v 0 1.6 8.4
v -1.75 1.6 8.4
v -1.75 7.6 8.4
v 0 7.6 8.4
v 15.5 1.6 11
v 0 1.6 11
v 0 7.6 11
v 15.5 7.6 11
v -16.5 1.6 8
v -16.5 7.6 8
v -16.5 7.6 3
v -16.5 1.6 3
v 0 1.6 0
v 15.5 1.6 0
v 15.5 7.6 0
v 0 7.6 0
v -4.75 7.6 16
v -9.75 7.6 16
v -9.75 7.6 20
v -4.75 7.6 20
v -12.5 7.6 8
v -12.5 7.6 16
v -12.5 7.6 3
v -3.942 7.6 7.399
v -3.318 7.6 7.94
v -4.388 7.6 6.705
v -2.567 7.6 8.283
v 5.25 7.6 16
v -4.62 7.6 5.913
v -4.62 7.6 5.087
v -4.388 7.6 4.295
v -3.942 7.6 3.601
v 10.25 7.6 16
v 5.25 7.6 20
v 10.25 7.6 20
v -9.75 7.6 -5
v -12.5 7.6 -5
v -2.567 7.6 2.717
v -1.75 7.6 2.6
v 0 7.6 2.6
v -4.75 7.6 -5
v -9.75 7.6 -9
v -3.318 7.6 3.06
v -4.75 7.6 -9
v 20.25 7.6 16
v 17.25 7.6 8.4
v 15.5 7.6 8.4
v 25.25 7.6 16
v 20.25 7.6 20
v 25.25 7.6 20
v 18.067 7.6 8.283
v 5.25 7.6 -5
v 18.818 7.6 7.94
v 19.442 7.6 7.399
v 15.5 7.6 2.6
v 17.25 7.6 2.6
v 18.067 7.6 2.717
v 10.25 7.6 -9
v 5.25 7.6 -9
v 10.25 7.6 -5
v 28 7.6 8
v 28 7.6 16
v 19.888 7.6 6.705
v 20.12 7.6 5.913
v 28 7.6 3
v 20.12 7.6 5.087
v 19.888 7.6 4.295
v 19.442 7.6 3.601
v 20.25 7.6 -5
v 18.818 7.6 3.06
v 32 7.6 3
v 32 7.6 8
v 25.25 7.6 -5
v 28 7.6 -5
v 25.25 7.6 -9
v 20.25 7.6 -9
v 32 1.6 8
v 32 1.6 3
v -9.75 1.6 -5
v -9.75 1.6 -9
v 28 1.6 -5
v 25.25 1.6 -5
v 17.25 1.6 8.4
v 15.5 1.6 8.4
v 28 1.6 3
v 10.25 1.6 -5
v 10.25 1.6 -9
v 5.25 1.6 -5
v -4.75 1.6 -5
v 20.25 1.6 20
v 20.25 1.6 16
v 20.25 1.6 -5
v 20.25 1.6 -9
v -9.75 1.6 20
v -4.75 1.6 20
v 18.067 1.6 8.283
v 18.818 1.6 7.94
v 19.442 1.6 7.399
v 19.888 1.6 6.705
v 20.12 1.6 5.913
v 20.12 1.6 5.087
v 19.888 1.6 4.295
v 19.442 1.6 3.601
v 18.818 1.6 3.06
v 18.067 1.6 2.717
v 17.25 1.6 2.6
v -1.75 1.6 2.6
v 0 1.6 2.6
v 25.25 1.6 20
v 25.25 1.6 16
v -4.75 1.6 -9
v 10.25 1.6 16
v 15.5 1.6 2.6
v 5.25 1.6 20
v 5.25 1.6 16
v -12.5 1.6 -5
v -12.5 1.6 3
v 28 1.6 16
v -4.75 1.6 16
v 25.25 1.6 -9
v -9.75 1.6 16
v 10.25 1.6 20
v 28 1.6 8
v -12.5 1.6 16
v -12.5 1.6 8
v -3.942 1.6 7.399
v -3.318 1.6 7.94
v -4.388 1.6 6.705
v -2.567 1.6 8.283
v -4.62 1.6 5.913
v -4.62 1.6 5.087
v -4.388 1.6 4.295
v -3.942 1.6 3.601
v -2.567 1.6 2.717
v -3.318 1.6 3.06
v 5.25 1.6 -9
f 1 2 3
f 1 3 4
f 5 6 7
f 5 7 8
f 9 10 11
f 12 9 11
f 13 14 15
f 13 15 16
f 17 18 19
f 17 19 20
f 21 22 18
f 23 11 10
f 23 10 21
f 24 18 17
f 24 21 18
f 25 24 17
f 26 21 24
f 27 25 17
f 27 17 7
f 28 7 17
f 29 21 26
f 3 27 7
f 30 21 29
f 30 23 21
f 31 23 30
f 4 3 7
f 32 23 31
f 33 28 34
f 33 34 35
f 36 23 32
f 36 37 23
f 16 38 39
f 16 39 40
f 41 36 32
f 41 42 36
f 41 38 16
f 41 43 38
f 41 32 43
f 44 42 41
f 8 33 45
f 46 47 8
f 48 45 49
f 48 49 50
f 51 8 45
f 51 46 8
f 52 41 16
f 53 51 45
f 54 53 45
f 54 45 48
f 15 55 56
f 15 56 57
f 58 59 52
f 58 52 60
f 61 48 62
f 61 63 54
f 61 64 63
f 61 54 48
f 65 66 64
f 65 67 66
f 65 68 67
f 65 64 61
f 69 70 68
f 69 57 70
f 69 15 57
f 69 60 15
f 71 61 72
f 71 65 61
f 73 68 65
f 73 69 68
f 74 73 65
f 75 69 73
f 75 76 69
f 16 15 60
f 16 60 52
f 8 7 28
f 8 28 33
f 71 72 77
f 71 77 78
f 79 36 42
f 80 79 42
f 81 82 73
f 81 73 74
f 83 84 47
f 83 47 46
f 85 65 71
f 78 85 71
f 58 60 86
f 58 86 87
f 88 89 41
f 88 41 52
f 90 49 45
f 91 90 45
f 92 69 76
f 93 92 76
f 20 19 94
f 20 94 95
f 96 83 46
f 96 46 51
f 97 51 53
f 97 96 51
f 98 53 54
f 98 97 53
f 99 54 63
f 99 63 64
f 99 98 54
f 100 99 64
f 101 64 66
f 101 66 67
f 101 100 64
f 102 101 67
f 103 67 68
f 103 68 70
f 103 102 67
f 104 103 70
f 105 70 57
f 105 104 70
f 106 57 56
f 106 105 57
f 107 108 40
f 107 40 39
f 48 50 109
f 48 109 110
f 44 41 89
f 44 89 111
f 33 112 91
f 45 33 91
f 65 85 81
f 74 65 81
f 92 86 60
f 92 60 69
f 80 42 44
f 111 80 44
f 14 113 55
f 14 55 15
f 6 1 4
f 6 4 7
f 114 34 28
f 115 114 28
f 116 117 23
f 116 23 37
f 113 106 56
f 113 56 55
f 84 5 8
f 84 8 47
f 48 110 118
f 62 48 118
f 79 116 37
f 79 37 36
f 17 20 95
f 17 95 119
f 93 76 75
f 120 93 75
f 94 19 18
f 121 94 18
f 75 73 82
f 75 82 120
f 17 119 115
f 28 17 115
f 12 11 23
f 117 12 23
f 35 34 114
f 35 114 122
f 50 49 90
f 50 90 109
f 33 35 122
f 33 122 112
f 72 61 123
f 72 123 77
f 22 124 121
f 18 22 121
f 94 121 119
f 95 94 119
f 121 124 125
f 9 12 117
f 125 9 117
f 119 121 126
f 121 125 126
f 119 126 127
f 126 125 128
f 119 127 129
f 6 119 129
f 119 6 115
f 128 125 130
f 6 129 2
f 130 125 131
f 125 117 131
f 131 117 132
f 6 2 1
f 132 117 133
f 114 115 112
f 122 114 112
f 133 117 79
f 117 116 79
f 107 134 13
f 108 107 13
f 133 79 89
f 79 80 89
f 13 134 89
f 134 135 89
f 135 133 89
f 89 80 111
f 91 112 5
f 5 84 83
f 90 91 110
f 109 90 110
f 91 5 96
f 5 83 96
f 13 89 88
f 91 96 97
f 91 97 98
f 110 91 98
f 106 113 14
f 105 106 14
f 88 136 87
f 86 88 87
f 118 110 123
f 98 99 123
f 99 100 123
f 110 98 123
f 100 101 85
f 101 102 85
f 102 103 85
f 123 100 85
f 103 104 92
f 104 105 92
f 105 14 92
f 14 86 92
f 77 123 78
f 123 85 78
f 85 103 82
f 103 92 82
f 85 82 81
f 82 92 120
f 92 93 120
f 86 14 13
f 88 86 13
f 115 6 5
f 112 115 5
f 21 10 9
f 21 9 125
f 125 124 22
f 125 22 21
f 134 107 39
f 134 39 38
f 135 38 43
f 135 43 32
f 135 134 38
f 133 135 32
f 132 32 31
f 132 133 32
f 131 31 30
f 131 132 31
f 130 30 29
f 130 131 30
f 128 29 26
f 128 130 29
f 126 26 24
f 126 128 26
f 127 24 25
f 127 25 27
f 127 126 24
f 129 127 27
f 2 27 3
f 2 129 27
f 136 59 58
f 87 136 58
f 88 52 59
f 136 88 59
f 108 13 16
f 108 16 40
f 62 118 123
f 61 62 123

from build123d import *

# Parameters (mm, degrees)
SKETCH1_W           = 15.5
SKETCH1_H           = 11
BOSS_EXTRUDE1_DEPTH = 1.6
BOSS_EXTRUDE2_DEPTH = 1.6
SKETCH3_W           = 40.5
SKETCH3_H           = 21
BOSS_EXTRUDE3_DEPTH = 6
CUT_EXTRUDE1_DEPTH  = 2.6
SKETCH5_W           = 5
SKETCH5_H           = 4
BOSS_EXTRUDE4_DEPTH = 6
LPATTERN1_COUNT     = 2
LPATTERN1_PITCH     = 15
LPATTERN1_COL_COUNT = 2
LPATTERN1_COL_PITCH = 15
SKETCH6_W           = 4
SKETCH6_H           = 5
BOSS_EXTRUDE5_DEPTH = 6


with BuildPart() as part:
    # Sketch1 → Boss-Extrude1 (new body)
    with BuildSketch(Plane(origin=(0, 0, 0), x_dir=(1, 0, 0), z_dir=(0, 1, 0))):
        with Locations((7.75, -5.5)):
            Rectangle(SKETCH1_W, SKETCH1_H)
    extrude(amount=BOSS_EXTRUDE1_DEPTH)

    # Sketch2 → Boss-Extrude2 (add, through all)
    with BuildSketch(Plane(origin=(0, 1.6, 0), x_dir=(1, 0, 0), z_dir=(0, 1, 0))):
        with BuildLine():
            Line((-1.75, -4), (-1.75, -2.6))
            ThreePointArc((-1.75, -2.6), (-4.65, -5.5), (-1.75, -8.4))
            Line((-1.75, -8.4), (-1.75, -7))
            ThreePointArc((-1.75, -7), (-3.25, -5.5), (-1.75, -4))
        make_face()
        with BuildLine():
            ThreePointArc((0, -3.187533784), (-0.827002716, -2.750804479), (-1.75, -2.6))
            Line((-1.75, -2.6), (-1.75, -4))
            ThreePointArc((-1.75, -4), (-0.689339828, -4.439339828), (-0.25, -5.5))
            ThreePointArc((-0.25, -5.5), (-0.689339828, -6.560660172), (-1.75, -7))
            Line((-1.75, -7), (-1.75, -8.4))
            ThreePointArc((-1.75, -8.4), (-0.827002716, -8.249195521), (0, -7.812466216))
            Line((0, -7.812466216), (0, -3.187533784))
        make_face()
        with BuildLine():
            Line((0, -2.6), (-1.75, -2.6))
            ThreePointArc((-1.75, -2.6), (-0.827002716, -2.750804479), (0, -3.187533784))
            Line((0, -3.187533784), (0, -2.6))
        make_face()
        with BuildLine():
            ThreePointArc((0, -7.812466216), (-0.827002716, -8.249195521), (-1.75, -8.4))
            Line((-1.75, -8.4), (0, -8.4))
            Line((0, -8.4), (0, -7.812466216))
        make_face()
        with BuildLine():
            ThreePointArc((20.15, -5.5), (19.300609665, -3.449390335), (17.25, -2.6))
            Line((17.25, -2.6), (17.25, -4))
            ThreePointArc((17.25, -4), (18.310660172, -4.439339828), (18.75, -5.5))
            ThreePointArc((18.75, -5.5), (18.310660172, -6.560660172), (17.25, -7))
            Line((17.25, -7), (17.25, -8.4))
            ThreePointArc((17.25, -8.4), (19.300609665, -7.550609665), (20.15, -5.5))
        make_face()
        with BuildLine():
            Line((17.25, -4), (17.25, -2.6))
            ThreePointArc((17.25, -2.6), (16.327002716, -2.750804479), (15.5, -3.187533784))
            Line((15.5, -3.187533784), (15.5, -7.812466216))
            ThreePointArc((15.5, -7.812466216), (16.327002716, -8.249195521), (17.25, -8.4))
            Line((17.25, -8.4), (17.25, -7))
            ThreePointArc((17.25, -7), (15.75, -5.5), (17.25, -4))
        make_face()
        with BuildLine():
            Line((17.25, -2.6), (15.5, -2.6))
            Line((15.5, -2.6), (15.5, -3.187533784))
            ThreePointArc((15.5, -3.187533784), (16.327002716, -2.750804479), (17.25, -2.6))
        make_face()
        with BuildLine():
            Line((15.5, -7.812466216), (15.5, -8.4))
            Line((15.5, -8.4), (17.25, -8.4))
            ThreePointArc((17.25, -8.4), (16.327002716, -8.249195521), (15.5, -7.812466216))
        make_face()
    extrude(amount=-BOSS_EXTRUDE2_DEPTH)

    # Sketch4 → Cut-Extrude1 (cut, through all)
    with BuildSketch(Plane(origin=(0, 1.6, 0), x_dir=(1, 0, 0), z_dir=(0, 1, 0))):
        with BuildLine():
            Line((0, 0), (0, -2.6))
            Line((0, -2.6), (-1.75, -2.6))
            ThreePointArc((-1.75, -2.6), (-4.65, -5.5), (-1.75, -8.4))
            Line((-1.75, -8.4), (0, -8.4))
            Line((0, -8.4), (0, -11))
            Line((0, -11), (15.5, -11))
            Line((15.5, -11), (15.5, -8.4))
            Line((15.5, -8.4), (17.25, -8.4))
            ThreePointArc((17.25, -8.4), (20.15, -5.5), (17.25, -2.6))
            Line((17.25, -2.6), (15.5, -2.6))
            Line((15.5, -2.6), (15.5, 0))
            Line((15.5, 0), (0, 0))
        make_face()
    extrude(amount=-CUT_EXTRUDE1_DEPTH, mode=Mode.SUBTRACT)


with BuildPart() as body_2:
    # Sketch3 → Boss-Extrude3 (new body)
    with BuildSketch(Plane(origin=(0, 1.6, 0), x_dir=(1, 0, 0), z_dir=(0, 1, 0))):
        with Locations((7.75, -5.5)):
            Rectangle(SKETCH3_W, SKETCH3_H)
        with BuildLine():
            Line((0, 0), (0, -2.6))
            Line((0, -2.6), (-1.75, -2.6))
            ThreePointArc((-1.75, -2.6), (-4.65, -5.5), (-1.75, -8.4))
            Line((-1.75, -8.4), (0, -8.4))
            Line((0, -8.4), (0, -11))
            Line((0, -11), (15.5, -11))
            Line((15.5, -11), (15.5, -8.4))
            Line((15.5, -8.4), (17.25, -8.4))
            ThreePointArc((17.25, -8.4), (20.15, -5.5), (17.25, -2.6))
            Line((17.25, -2.6), (15.5, -2.6))
            Line((15.5, -2.6), (15.5, 0))
            Line((15.5, 0), (0, 0))
        make_face(mode=Mode.SUBTRACT)
    extrude(amount=BOSS_EXTRUDE3_DEPTH)

    # Sketch5 → Boss-Extrude4 (add, through all)
    with BuildSketch(Plane(origin=(0, 7.6, 0), x_dir=(1, 0, 0), z_dir=(0, 1, 0))):
        with Locations((7.75, 7)):
            Rectangle(SKETCH5_W, SKETCH5_H)
        with Locations((7.75, -18)):
            Rectangle(SKETCH5_W, SKETCH5_H)
    boss_extrude4 = extrude(amount=-BOSS_EXTRUDE4_DEPTH)

    # LPattern1: Boss-Extrude4 ×2
    with Locations(*[(i * LPATTERN1_PITCH, 0, 0) for i in range(1, LPATTERN1_COUNT)]):
        add(boss_extrude4)

    # LPattern1 col: Boss-Extrude4 ×2
    with Locations(*[(-i * LPATTERN1_COL_PITCH, 0, 0) for i in range(1, LPATTERN1_COL_COUNT)]):
        add(boss_extrude4)

    # Sketch6 → Boss-Extrude5 (add, through all)
    with BuildSketch(Plane(origin=(0, 7.6, 0), x_dir=(1, 0, 0), z_dir=(0, 1, 0))):
        with Locations((-14.5, -5.5)):
            Rectangle(SKETCH6_W, SKETCH6_H)
        with Locations((30, -5.5)):
            Rectangle(SKETCH6_W, SKETCH6_H)
    extrude(amount=-BOSS_EXTRUDE5_DEPTH)


solid = body_2.part
